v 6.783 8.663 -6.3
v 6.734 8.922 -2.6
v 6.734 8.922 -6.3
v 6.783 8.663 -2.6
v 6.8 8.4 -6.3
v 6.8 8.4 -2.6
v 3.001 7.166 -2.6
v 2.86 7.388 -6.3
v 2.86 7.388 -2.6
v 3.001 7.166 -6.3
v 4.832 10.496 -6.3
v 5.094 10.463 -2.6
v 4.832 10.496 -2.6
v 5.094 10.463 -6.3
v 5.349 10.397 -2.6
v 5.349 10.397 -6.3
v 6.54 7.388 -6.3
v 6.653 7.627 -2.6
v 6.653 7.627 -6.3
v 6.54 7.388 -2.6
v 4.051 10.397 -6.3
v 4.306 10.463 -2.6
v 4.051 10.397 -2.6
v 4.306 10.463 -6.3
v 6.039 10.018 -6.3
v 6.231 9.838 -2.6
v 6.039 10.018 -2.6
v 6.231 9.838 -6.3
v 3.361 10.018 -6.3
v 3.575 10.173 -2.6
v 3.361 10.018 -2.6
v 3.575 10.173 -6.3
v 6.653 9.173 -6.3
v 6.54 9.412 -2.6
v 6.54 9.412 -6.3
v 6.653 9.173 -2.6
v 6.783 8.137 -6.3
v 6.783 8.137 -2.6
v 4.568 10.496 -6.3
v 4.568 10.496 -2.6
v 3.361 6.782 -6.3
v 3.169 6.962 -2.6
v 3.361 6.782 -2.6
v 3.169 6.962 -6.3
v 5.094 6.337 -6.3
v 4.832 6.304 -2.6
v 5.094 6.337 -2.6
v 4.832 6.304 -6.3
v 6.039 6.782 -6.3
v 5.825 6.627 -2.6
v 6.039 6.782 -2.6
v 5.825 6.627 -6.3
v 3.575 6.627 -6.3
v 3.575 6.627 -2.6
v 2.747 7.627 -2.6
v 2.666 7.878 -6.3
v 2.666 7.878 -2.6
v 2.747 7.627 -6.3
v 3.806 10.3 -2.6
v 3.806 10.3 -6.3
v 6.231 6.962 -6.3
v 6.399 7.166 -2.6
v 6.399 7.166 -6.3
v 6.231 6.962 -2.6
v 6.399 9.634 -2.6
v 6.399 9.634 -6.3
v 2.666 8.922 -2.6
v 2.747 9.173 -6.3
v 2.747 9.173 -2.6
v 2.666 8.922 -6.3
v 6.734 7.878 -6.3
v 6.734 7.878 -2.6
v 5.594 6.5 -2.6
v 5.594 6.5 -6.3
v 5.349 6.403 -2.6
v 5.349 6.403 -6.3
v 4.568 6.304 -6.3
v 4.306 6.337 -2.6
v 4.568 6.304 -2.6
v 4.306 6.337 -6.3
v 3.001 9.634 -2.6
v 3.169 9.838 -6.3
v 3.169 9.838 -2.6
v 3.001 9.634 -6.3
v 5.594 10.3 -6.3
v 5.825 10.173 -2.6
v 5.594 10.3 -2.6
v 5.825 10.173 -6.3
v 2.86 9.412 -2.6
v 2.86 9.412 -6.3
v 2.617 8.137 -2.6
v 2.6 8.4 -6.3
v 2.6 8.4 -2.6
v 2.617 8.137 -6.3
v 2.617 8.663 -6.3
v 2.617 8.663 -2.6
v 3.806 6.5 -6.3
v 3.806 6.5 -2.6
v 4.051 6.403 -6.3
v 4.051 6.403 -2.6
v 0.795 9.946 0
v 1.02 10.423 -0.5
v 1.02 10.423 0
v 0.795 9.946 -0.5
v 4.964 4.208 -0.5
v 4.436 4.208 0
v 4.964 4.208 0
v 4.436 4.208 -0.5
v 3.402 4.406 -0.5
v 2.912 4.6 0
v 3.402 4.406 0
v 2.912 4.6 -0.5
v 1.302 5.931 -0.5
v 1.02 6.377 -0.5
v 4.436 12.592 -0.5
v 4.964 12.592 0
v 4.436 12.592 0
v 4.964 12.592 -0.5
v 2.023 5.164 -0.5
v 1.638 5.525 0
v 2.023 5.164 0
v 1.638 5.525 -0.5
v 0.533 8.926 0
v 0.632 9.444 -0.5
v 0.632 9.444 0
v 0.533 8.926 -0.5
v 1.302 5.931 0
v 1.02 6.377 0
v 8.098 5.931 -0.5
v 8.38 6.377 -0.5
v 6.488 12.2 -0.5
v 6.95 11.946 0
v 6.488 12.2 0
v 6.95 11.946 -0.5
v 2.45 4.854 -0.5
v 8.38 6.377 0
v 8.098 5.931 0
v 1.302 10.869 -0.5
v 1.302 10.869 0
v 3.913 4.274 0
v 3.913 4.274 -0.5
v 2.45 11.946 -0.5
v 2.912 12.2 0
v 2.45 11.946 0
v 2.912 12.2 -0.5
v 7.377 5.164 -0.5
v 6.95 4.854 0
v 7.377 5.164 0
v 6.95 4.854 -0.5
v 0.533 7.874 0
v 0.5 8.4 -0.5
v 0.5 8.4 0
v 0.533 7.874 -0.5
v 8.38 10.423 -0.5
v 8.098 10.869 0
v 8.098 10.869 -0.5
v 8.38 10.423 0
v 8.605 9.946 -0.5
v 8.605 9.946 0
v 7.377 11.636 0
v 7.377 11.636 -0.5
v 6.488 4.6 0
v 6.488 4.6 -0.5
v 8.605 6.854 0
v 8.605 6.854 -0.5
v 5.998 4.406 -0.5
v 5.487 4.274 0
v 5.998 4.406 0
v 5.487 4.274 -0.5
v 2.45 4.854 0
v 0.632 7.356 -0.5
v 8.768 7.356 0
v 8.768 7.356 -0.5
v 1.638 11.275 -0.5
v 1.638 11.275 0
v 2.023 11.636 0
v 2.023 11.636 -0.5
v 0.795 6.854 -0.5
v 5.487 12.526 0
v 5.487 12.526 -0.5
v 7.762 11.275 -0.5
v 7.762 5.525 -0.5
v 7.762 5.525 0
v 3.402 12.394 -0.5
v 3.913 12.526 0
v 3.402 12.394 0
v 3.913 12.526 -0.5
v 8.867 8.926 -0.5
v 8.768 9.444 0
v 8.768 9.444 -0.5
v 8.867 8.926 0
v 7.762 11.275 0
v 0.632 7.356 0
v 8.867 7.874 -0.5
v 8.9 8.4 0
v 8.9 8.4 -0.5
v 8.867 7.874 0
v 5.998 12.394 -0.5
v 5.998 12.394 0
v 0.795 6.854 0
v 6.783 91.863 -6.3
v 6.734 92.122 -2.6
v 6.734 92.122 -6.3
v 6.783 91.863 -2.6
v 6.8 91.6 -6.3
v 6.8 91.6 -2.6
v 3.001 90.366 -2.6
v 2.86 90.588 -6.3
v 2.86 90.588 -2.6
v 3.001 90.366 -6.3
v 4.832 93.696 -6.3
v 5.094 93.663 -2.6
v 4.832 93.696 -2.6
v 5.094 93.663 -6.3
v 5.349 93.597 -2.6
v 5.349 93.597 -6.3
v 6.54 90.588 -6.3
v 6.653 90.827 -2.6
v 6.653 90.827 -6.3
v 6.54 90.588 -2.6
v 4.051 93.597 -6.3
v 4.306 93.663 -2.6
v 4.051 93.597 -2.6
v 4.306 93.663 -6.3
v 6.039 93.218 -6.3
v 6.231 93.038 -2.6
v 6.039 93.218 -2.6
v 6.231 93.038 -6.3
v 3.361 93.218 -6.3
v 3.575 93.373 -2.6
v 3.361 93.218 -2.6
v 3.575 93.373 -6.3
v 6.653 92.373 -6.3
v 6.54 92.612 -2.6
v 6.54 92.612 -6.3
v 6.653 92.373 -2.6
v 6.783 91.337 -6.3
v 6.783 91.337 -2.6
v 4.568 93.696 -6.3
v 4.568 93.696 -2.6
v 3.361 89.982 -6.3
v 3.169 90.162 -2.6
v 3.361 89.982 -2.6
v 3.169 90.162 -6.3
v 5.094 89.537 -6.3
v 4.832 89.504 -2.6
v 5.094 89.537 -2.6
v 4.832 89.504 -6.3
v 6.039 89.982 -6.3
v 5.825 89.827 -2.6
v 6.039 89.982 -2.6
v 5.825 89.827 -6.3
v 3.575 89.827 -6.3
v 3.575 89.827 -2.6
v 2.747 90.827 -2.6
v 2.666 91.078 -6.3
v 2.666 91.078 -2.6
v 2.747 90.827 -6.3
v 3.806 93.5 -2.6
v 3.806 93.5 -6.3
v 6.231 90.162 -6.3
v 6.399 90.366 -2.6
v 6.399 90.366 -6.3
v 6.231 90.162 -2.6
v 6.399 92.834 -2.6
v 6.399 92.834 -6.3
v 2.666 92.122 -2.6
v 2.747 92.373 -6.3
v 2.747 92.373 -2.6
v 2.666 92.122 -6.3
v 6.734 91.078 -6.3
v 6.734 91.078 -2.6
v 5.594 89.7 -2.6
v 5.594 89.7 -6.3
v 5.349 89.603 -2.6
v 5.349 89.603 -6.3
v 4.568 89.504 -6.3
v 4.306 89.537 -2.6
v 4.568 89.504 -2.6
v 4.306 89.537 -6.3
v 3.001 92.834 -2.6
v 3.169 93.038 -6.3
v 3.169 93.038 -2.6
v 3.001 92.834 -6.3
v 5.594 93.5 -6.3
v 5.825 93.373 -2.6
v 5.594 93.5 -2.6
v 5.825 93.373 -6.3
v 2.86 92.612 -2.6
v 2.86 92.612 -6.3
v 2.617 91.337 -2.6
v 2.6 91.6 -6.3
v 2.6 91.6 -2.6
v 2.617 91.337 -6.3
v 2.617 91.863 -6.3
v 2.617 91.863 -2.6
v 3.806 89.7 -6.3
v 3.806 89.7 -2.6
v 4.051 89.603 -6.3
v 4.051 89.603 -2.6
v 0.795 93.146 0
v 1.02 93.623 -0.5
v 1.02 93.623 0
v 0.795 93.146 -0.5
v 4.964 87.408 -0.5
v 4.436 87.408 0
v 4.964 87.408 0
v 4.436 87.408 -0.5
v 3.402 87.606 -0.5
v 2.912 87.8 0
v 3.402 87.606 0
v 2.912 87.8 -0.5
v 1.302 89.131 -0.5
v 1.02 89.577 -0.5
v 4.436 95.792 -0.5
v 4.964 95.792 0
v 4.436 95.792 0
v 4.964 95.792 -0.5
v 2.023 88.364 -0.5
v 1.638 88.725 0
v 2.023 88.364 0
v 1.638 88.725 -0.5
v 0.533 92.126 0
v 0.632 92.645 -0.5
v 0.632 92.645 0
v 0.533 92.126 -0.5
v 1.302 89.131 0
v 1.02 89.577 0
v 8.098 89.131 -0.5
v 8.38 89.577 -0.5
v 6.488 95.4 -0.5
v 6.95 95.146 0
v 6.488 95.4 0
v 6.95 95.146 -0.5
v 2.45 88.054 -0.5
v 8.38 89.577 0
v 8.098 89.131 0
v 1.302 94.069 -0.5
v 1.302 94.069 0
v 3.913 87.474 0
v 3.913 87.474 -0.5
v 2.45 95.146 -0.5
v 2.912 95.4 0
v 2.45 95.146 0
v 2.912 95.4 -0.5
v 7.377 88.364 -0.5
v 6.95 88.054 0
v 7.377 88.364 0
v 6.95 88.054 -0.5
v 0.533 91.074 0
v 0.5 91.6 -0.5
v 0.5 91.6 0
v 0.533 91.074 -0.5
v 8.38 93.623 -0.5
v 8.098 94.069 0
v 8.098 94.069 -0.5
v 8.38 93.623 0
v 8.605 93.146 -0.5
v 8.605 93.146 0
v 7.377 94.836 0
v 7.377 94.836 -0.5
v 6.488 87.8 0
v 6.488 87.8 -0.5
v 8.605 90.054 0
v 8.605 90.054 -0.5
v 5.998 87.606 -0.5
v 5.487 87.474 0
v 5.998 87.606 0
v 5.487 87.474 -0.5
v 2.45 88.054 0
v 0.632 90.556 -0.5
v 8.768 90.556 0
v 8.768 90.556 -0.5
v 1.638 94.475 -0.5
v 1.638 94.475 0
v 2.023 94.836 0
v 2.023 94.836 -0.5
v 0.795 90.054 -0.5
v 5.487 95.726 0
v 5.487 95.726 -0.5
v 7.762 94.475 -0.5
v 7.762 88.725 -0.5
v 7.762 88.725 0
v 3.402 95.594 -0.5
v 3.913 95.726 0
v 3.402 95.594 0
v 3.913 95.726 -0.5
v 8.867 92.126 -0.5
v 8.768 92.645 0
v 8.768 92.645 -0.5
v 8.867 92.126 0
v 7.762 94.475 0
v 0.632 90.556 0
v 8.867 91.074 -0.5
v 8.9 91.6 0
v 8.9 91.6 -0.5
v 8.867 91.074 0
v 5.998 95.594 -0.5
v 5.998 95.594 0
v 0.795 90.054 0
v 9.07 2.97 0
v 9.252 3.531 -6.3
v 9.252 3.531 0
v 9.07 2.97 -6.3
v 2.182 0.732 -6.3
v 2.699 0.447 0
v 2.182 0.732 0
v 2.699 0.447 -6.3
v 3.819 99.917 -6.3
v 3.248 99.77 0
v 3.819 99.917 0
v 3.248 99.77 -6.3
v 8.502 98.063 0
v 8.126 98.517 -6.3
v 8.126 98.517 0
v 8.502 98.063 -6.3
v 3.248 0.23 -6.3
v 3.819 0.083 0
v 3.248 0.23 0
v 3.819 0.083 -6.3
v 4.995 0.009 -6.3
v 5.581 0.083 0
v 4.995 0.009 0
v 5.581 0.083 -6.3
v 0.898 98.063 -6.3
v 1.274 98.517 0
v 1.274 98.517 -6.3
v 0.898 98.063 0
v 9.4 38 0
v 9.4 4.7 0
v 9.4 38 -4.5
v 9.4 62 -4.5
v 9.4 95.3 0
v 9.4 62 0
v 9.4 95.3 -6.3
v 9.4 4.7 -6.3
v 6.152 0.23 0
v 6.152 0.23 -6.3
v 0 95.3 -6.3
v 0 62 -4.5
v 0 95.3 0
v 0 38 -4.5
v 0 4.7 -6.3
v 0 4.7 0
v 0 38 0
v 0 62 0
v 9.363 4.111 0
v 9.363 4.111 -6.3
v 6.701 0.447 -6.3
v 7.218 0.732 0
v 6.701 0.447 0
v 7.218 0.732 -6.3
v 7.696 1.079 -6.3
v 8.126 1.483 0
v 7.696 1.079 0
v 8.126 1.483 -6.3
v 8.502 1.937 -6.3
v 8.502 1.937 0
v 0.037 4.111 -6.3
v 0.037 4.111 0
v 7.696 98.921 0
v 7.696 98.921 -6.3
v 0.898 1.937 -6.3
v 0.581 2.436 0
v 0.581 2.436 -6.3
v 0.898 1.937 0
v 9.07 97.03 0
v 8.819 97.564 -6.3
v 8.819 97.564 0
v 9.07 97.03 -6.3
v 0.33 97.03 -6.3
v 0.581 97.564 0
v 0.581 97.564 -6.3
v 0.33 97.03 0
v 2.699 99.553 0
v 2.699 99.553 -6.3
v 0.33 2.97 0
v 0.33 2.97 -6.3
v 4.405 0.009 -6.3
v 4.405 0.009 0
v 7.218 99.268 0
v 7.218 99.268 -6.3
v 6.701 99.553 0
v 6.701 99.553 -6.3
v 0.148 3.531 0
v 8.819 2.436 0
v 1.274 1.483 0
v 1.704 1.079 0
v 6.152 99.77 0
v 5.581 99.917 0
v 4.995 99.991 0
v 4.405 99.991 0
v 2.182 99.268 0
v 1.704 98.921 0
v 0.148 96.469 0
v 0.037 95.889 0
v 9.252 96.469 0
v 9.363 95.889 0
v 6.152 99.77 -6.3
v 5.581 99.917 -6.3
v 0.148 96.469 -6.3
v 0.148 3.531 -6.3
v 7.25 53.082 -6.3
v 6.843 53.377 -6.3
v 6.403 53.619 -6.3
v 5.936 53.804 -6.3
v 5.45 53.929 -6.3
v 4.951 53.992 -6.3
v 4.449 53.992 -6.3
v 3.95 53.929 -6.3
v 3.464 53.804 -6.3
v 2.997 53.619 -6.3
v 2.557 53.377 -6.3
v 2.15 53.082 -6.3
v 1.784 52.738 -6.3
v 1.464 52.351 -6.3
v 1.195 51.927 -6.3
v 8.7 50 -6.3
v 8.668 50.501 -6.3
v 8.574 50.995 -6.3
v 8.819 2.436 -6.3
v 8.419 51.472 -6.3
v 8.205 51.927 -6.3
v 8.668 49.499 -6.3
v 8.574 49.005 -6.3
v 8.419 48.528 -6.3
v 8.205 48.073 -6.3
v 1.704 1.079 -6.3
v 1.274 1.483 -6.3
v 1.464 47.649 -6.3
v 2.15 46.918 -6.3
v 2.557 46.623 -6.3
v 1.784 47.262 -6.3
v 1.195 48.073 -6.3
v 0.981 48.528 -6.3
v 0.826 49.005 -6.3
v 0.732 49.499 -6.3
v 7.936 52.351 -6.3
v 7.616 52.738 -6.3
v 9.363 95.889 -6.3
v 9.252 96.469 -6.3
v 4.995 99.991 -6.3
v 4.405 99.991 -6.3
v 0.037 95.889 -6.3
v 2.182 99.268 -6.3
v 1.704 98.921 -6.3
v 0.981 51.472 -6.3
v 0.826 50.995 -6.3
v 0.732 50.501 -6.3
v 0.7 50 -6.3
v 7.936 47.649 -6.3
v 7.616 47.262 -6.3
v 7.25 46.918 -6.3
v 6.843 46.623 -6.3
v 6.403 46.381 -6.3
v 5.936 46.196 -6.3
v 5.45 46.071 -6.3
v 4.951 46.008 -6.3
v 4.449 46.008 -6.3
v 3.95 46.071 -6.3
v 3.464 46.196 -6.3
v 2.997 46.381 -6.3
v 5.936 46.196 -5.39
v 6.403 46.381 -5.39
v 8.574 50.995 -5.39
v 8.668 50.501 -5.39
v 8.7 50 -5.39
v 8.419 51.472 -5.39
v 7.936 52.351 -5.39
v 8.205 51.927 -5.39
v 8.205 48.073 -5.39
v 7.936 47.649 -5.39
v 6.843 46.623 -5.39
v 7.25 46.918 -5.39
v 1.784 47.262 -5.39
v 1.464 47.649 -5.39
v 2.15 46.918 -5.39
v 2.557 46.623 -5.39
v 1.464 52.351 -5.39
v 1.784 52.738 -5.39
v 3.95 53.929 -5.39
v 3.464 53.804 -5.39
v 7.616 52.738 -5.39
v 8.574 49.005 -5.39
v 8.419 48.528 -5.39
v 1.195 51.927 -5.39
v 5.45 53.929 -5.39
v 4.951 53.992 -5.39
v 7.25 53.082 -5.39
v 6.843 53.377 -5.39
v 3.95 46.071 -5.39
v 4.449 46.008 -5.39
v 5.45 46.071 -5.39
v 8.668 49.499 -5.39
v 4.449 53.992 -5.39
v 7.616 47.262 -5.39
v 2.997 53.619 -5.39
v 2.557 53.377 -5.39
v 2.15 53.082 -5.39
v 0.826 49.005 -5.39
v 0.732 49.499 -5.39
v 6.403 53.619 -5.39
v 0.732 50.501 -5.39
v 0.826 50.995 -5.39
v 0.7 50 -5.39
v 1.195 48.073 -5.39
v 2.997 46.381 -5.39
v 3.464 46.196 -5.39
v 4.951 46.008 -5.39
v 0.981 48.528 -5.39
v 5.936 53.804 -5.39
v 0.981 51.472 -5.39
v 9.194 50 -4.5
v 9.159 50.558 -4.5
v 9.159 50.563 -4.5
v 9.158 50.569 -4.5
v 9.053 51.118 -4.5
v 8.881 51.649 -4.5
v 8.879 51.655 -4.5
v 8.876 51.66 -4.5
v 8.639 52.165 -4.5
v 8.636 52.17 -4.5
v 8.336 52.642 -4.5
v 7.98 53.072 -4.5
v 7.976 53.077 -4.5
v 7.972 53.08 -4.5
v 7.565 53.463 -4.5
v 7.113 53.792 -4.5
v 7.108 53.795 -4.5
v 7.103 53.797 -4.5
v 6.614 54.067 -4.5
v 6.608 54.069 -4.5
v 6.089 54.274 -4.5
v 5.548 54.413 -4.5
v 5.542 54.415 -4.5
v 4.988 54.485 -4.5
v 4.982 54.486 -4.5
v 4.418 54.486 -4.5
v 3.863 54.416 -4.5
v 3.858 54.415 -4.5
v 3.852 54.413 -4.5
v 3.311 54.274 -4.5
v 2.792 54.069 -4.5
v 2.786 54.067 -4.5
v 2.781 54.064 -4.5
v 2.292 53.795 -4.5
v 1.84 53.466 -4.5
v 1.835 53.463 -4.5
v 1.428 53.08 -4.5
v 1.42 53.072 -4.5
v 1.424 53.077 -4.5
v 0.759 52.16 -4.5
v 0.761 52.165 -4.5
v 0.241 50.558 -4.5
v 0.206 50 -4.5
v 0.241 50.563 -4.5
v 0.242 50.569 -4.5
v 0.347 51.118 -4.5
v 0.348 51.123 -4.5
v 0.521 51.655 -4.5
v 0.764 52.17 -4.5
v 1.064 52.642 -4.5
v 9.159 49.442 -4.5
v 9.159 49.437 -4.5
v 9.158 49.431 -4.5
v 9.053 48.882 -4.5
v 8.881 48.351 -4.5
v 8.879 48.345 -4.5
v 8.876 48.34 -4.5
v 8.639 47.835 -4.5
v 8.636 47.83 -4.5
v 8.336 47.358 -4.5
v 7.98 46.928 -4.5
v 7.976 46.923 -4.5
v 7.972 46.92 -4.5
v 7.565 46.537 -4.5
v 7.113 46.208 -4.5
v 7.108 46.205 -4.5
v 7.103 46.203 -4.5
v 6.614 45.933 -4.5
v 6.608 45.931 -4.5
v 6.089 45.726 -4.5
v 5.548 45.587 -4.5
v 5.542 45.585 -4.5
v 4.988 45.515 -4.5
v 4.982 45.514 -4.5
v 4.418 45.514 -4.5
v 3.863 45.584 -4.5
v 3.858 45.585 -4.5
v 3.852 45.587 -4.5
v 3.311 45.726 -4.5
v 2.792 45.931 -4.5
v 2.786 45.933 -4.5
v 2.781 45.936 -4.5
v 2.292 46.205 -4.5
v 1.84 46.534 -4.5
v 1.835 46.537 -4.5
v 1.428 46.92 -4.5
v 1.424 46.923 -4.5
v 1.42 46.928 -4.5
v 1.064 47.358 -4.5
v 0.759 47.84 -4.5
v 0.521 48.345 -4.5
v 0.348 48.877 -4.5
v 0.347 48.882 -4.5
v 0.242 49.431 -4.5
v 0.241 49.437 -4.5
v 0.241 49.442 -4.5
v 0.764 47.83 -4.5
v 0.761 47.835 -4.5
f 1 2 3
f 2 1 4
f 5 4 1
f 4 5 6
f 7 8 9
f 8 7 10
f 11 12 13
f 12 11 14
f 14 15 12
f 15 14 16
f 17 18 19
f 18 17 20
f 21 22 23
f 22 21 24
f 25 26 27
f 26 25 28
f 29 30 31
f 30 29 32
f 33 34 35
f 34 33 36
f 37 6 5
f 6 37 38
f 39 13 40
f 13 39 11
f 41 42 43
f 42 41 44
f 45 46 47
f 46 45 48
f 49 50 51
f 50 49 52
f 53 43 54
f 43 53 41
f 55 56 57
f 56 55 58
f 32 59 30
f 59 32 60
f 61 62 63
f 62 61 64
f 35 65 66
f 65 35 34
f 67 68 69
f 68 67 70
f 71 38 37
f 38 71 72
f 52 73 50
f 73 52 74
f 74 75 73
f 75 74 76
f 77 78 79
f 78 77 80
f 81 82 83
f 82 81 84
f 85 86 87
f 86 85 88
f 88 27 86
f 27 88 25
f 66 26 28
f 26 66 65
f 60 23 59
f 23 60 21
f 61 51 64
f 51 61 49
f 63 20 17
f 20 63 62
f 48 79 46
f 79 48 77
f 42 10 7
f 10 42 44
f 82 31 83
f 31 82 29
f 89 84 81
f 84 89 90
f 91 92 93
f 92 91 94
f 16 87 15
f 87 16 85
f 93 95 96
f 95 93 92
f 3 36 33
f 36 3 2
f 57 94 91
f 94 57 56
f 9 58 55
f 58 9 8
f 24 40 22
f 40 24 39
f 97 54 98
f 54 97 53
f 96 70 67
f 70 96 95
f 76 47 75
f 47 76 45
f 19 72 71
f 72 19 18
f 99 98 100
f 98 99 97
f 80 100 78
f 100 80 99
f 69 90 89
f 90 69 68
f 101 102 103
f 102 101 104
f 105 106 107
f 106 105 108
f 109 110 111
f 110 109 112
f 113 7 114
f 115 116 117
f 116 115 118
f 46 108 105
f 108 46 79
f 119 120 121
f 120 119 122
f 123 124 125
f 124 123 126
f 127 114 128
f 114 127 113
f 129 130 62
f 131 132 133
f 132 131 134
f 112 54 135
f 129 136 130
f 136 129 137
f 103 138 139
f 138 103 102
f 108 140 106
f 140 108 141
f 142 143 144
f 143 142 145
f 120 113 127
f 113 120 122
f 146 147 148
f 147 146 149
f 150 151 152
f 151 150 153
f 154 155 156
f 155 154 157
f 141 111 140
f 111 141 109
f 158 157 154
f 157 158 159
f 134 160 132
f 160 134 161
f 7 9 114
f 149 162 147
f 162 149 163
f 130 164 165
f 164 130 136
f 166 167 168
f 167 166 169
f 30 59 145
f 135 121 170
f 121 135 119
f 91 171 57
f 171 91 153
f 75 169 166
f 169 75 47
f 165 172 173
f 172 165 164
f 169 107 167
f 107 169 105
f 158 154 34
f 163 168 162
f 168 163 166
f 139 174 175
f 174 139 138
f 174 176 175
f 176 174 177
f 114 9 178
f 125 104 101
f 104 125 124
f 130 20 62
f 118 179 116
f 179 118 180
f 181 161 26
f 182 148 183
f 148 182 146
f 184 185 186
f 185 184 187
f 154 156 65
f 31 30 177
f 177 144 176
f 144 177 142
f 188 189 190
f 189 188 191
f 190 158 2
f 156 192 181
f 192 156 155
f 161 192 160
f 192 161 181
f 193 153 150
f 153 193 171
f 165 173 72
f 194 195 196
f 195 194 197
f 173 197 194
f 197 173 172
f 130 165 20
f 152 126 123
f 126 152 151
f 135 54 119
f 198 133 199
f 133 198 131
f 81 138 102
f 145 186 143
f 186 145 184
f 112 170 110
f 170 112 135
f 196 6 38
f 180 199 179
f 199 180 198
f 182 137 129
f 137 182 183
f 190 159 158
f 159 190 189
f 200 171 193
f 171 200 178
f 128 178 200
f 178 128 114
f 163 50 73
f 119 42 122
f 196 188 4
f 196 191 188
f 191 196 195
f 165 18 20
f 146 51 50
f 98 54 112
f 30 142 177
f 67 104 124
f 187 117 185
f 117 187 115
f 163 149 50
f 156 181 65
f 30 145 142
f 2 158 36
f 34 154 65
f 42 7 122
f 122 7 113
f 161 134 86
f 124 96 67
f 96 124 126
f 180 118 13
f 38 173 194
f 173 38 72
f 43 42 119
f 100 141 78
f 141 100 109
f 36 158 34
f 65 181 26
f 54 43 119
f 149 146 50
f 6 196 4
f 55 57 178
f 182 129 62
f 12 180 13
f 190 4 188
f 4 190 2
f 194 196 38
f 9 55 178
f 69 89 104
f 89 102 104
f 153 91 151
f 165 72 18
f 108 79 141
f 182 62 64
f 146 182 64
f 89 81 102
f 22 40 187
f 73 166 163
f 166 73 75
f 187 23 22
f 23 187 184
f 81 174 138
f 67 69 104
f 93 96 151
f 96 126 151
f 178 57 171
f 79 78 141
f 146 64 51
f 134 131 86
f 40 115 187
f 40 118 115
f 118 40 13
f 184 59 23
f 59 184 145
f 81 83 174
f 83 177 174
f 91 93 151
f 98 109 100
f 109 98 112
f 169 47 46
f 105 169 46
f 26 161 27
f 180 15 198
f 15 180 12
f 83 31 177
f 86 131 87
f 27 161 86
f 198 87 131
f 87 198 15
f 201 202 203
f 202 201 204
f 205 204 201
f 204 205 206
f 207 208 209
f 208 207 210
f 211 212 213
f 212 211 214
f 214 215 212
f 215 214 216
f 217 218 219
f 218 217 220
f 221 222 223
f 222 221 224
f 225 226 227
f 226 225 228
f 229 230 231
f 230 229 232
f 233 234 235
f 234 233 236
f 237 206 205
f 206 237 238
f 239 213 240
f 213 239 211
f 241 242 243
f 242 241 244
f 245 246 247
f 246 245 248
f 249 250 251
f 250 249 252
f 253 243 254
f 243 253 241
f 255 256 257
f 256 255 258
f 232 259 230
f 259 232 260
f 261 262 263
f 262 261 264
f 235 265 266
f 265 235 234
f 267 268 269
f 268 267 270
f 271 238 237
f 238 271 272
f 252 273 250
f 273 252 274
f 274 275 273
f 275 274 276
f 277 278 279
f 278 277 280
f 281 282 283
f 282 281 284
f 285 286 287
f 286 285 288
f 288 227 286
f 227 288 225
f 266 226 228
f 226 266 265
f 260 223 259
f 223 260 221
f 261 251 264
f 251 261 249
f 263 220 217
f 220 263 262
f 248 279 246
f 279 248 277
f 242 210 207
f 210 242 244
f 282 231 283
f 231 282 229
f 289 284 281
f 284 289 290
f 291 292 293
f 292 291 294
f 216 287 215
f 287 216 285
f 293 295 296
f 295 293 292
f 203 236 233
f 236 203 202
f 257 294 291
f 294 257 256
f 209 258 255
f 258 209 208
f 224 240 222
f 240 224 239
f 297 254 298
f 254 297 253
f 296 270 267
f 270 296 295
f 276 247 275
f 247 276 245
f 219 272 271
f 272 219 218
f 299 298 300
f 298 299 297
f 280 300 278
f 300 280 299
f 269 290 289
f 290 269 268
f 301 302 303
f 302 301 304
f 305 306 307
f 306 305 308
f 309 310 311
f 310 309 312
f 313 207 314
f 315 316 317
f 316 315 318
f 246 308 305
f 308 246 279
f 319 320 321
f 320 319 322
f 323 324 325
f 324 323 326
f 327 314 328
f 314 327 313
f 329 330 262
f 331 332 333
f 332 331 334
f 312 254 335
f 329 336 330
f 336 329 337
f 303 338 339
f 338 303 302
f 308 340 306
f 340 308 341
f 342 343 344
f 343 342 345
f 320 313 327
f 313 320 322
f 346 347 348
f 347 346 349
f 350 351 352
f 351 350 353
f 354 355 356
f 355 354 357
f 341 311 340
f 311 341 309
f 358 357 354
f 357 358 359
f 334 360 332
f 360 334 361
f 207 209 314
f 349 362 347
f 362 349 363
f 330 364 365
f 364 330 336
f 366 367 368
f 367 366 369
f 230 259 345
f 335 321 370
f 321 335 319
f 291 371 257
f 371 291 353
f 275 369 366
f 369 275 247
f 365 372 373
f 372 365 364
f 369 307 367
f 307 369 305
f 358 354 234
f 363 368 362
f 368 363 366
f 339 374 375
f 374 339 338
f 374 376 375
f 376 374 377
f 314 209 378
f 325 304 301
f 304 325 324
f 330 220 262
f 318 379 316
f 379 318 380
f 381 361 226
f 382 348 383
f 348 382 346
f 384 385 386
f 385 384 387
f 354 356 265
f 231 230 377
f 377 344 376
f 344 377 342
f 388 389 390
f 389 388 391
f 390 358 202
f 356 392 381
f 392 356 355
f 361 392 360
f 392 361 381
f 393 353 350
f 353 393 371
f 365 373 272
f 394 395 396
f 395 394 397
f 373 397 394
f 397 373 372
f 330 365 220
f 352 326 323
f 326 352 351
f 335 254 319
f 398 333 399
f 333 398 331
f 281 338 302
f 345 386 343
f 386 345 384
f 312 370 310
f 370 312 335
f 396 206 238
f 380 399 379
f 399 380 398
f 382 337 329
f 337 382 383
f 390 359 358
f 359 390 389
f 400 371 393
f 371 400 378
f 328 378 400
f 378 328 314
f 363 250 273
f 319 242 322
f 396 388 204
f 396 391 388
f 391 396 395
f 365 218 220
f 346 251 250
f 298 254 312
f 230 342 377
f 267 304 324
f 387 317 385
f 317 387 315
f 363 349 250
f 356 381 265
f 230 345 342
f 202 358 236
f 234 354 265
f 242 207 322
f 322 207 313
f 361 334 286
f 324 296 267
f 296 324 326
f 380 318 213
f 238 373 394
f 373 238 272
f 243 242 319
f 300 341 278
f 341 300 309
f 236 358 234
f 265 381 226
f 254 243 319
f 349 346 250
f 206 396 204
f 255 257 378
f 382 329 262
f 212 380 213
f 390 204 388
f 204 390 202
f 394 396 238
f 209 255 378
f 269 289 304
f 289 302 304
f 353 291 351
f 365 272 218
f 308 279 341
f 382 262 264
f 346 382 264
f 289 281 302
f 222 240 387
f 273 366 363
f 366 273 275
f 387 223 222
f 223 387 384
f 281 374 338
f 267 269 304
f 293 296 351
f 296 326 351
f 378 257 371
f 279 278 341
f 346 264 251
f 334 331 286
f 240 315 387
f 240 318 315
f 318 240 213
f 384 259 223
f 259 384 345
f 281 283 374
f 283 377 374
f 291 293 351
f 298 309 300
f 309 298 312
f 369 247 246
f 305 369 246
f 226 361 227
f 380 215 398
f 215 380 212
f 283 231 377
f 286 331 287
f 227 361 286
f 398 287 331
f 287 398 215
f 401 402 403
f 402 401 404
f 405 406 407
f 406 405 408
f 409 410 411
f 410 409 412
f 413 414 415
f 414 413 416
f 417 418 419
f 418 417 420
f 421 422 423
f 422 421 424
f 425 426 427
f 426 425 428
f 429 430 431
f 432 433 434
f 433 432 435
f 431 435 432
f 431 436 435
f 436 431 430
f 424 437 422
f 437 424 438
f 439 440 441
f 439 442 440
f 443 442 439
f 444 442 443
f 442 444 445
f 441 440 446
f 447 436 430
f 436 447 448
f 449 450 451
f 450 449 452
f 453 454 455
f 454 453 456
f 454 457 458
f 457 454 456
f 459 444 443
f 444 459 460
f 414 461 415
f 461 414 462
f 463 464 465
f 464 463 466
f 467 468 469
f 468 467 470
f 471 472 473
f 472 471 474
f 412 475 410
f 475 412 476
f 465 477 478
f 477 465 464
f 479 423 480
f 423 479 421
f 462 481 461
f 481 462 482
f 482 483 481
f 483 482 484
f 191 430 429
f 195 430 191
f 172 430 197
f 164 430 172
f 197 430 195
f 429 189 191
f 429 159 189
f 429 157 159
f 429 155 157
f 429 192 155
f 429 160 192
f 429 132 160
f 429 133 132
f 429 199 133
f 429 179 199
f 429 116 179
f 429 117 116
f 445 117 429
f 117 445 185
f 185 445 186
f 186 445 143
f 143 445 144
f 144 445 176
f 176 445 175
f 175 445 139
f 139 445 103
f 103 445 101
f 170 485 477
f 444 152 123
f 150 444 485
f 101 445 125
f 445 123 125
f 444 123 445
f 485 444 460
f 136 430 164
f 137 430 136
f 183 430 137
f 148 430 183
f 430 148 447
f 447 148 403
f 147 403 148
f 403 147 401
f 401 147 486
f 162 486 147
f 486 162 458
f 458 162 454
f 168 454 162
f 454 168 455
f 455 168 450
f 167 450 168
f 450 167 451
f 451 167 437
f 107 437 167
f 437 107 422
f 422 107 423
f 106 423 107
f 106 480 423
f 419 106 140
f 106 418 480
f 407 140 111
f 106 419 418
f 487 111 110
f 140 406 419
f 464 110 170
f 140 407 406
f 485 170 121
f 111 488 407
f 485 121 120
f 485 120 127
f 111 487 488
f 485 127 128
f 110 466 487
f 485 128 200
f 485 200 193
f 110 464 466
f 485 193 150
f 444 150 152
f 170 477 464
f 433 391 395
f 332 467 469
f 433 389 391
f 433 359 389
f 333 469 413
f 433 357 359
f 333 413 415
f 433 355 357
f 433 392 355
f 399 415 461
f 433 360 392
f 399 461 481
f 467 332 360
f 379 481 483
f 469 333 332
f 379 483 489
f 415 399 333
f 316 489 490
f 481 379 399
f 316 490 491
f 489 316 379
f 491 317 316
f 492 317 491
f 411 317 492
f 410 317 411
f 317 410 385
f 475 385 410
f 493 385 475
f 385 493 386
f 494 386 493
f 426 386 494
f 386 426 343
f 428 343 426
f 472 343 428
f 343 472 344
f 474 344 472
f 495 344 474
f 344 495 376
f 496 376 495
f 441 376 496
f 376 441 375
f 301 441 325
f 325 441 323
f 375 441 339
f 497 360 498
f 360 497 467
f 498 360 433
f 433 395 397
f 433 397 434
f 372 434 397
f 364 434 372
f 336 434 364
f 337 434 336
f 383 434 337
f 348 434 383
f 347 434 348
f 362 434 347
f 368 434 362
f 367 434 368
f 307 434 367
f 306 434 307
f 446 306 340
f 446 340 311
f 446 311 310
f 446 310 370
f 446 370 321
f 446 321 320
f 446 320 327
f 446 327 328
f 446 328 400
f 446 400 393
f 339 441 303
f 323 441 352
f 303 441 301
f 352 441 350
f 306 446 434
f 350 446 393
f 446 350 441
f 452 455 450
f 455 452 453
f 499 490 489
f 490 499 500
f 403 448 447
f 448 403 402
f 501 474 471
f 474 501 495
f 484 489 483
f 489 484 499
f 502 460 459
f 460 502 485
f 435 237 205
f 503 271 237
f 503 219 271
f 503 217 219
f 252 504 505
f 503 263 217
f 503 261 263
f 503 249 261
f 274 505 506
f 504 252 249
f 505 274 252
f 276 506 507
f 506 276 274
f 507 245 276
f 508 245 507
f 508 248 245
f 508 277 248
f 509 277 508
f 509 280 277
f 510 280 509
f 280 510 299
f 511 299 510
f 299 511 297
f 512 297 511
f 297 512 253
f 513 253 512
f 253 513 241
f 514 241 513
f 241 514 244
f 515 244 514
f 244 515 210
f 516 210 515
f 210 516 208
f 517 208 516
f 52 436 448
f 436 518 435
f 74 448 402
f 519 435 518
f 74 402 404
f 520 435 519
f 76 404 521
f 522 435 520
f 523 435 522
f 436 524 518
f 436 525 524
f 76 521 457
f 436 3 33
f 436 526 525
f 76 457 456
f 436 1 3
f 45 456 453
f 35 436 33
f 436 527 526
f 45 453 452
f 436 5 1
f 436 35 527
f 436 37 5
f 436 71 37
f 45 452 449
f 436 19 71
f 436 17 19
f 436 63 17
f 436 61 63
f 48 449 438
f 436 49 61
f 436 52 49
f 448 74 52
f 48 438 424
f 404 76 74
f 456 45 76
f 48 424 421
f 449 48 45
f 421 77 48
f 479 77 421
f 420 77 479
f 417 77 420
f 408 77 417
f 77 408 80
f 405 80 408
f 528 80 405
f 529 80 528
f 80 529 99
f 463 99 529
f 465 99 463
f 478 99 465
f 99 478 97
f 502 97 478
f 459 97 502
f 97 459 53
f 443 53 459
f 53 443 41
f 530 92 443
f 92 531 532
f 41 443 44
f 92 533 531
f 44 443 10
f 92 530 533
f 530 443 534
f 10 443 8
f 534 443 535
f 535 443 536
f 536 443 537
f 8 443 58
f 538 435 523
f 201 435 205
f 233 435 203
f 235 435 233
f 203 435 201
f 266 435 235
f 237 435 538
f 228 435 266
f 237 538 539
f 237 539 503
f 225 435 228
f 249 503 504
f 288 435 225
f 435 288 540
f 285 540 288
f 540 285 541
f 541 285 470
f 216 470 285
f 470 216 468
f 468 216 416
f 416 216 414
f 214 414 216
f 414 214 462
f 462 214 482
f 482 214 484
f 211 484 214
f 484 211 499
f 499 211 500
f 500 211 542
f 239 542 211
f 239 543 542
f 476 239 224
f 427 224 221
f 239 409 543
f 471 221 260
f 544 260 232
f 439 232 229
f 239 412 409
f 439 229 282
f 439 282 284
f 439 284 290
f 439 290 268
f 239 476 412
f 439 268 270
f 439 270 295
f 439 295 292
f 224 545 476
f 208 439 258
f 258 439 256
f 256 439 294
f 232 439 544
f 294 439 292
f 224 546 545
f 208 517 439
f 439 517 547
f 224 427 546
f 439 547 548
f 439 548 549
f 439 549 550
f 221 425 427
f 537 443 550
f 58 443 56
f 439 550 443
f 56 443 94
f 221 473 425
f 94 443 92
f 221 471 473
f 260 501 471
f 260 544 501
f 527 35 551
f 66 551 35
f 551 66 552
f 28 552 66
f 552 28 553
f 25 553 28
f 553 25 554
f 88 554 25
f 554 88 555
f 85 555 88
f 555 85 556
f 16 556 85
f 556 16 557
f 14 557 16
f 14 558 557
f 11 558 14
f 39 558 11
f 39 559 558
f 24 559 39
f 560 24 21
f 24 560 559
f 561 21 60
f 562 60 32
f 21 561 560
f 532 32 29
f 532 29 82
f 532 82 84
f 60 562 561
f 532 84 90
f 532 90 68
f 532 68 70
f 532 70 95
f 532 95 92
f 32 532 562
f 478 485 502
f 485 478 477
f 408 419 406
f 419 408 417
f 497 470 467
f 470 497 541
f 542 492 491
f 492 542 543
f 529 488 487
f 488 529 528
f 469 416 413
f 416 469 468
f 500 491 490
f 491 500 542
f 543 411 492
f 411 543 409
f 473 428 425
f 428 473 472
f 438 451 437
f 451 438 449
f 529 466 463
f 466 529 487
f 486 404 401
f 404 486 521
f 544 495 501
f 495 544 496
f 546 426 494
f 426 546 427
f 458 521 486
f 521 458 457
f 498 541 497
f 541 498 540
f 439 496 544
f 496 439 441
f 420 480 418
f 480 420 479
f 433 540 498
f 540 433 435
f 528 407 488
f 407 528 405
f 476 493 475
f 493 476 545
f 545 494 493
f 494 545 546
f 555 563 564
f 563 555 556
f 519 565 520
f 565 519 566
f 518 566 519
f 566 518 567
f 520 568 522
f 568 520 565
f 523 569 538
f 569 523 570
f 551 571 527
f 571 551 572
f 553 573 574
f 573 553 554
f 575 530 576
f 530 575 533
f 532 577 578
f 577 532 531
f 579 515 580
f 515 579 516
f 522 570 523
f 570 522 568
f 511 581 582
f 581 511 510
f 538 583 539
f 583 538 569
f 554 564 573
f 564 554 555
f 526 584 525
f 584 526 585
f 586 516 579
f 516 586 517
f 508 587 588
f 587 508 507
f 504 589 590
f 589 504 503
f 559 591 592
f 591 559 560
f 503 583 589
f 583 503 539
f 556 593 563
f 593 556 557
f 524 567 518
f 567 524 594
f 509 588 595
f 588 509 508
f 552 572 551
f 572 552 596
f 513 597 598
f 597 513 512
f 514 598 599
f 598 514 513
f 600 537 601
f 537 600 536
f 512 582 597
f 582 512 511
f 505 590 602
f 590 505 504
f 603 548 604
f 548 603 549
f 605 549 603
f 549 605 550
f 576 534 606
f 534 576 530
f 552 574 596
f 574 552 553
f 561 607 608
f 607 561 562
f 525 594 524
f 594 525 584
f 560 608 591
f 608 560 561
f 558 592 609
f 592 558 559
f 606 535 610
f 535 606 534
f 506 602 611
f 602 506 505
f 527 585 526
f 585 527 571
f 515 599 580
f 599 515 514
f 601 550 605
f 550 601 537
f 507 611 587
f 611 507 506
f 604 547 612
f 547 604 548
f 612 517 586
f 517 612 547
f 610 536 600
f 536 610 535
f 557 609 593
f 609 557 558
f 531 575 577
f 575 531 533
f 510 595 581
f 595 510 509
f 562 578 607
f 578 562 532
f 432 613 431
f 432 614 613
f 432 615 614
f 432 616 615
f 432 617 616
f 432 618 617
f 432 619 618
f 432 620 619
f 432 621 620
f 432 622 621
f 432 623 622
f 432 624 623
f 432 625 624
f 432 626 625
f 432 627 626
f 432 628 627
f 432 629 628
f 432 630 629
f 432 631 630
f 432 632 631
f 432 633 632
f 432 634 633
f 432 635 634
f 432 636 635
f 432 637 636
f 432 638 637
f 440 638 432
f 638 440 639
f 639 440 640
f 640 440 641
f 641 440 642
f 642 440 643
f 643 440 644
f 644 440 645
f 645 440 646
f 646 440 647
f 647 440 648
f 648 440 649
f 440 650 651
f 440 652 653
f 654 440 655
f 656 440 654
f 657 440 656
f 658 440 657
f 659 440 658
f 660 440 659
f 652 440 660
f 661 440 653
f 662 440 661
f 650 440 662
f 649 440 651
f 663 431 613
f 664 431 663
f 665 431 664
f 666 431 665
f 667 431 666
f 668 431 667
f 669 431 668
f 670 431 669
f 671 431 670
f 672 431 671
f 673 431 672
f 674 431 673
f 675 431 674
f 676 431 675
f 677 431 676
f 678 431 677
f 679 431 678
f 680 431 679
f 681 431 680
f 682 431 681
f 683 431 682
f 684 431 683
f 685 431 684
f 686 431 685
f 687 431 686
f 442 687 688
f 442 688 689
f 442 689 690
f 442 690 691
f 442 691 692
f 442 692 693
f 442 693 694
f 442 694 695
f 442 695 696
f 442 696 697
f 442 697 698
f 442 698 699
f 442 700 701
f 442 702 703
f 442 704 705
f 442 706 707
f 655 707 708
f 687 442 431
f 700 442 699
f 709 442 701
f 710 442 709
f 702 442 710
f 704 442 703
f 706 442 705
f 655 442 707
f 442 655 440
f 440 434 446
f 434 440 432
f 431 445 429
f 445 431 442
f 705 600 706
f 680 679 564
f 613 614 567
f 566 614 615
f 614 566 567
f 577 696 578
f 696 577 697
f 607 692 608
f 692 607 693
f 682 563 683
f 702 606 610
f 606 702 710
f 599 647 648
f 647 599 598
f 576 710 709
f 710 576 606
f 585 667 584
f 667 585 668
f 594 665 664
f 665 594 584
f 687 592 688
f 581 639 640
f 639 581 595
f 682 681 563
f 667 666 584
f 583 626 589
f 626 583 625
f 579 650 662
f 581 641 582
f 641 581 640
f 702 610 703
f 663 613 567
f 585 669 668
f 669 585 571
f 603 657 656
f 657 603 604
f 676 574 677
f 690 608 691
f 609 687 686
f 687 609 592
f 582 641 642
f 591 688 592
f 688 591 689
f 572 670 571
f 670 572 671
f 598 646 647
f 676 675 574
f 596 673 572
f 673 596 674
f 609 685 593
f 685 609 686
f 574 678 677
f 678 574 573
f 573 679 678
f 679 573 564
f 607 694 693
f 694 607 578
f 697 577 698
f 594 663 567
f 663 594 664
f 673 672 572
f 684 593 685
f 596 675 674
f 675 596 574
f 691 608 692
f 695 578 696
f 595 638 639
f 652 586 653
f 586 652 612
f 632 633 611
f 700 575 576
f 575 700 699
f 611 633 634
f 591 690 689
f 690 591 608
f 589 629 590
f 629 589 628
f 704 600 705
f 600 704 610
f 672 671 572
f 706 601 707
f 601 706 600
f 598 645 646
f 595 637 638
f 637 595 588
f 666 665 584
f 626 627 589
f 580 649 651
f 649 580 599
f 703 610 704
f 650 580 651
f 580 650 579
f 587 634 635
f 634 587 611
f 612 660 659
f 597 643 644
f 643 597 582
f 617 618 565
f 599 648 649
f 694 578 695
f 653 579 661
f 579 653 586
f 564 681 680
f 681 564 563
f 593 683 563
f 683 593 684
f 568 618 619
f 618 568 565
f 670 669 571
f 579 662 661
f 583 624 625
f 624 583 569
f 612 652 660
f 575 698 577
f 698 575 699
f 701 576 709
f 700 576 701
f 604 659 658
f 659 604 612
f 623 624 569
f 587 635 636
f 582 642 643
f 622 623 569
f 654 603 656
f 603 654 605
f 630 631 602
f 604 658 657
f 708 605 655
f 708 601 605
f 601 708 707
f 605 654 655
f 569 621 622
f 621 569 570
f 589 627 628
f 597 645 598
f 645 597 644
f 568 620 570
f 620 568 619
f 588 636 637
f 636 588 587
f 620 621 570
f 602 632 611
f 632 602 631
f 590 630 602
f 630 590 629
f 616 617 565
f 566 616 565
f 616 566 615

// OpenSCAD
// Router jig slides

Width = 100;
SlotSize = 9.4;
Depth = 6.7 - 0.4;
CenterHoleDia = 8;
ScrewDia = 4.2;
BoltHeadWidth = 23 + 1;
LipThickness = 2.3 - 0.5;

$fn=50;

difference() {
  // Body
  translate([0,0,-Depth]) hull() {
    translate([SlotSize/2, SlotSize/2, 0]) cylinder(d=SlotSize, h=Depth);
    translate([SlotSize/2, Width-SlotSize/2, 0]) cylinder(d=SlotSize, h=Depth);
  }
  // Center hole
  translate([SlotSize/2, Width/2, -Depth-1]) cylinder(d=CenterHoleDia, h = Depth+2);

  // Bolt head
  translate([-1, Width/2-BoltHeadWidth/2, -Depth+LipThickness]) cube([SlotSize+2, BoltHeadWidth, Depth]);
  // Bolt head countersink for weld seam
  translate([SlotSize/2, Width/2, -Depth+LipThickness/2+0.01])
    cylinder(r1=CenterHoleDia/2, r2=CenterHoleDia/2+(SlotSize-CenterHoleDia)/2-0.2, h=LipThickness/2);

  // Screw holes
  translate([SlotSize/2, ScrewDia*2, -1]) ScrewHole(ScrewDia, Depth);
  translate([SlotSize/2, Width-ScrewDia*2, -1]) ScrewHole(ScrewDia, Depth);
}

module ScrewHole(d, h, rebate=0.5) {
  // Screw hole
  translate([0,0,-h]) cylinder(d=d, h=h, $fn=50);
  hull() {
    // Countersink
    translate([0,0,rebate-d/2]) cylinder(r1=d/2, r2=d, h=d/2, $fn=50);
    // Top clearance
    translate([0,0,rebate]) cylinder(r=d, h=rebate+.01, $fn=50);
  }
}
